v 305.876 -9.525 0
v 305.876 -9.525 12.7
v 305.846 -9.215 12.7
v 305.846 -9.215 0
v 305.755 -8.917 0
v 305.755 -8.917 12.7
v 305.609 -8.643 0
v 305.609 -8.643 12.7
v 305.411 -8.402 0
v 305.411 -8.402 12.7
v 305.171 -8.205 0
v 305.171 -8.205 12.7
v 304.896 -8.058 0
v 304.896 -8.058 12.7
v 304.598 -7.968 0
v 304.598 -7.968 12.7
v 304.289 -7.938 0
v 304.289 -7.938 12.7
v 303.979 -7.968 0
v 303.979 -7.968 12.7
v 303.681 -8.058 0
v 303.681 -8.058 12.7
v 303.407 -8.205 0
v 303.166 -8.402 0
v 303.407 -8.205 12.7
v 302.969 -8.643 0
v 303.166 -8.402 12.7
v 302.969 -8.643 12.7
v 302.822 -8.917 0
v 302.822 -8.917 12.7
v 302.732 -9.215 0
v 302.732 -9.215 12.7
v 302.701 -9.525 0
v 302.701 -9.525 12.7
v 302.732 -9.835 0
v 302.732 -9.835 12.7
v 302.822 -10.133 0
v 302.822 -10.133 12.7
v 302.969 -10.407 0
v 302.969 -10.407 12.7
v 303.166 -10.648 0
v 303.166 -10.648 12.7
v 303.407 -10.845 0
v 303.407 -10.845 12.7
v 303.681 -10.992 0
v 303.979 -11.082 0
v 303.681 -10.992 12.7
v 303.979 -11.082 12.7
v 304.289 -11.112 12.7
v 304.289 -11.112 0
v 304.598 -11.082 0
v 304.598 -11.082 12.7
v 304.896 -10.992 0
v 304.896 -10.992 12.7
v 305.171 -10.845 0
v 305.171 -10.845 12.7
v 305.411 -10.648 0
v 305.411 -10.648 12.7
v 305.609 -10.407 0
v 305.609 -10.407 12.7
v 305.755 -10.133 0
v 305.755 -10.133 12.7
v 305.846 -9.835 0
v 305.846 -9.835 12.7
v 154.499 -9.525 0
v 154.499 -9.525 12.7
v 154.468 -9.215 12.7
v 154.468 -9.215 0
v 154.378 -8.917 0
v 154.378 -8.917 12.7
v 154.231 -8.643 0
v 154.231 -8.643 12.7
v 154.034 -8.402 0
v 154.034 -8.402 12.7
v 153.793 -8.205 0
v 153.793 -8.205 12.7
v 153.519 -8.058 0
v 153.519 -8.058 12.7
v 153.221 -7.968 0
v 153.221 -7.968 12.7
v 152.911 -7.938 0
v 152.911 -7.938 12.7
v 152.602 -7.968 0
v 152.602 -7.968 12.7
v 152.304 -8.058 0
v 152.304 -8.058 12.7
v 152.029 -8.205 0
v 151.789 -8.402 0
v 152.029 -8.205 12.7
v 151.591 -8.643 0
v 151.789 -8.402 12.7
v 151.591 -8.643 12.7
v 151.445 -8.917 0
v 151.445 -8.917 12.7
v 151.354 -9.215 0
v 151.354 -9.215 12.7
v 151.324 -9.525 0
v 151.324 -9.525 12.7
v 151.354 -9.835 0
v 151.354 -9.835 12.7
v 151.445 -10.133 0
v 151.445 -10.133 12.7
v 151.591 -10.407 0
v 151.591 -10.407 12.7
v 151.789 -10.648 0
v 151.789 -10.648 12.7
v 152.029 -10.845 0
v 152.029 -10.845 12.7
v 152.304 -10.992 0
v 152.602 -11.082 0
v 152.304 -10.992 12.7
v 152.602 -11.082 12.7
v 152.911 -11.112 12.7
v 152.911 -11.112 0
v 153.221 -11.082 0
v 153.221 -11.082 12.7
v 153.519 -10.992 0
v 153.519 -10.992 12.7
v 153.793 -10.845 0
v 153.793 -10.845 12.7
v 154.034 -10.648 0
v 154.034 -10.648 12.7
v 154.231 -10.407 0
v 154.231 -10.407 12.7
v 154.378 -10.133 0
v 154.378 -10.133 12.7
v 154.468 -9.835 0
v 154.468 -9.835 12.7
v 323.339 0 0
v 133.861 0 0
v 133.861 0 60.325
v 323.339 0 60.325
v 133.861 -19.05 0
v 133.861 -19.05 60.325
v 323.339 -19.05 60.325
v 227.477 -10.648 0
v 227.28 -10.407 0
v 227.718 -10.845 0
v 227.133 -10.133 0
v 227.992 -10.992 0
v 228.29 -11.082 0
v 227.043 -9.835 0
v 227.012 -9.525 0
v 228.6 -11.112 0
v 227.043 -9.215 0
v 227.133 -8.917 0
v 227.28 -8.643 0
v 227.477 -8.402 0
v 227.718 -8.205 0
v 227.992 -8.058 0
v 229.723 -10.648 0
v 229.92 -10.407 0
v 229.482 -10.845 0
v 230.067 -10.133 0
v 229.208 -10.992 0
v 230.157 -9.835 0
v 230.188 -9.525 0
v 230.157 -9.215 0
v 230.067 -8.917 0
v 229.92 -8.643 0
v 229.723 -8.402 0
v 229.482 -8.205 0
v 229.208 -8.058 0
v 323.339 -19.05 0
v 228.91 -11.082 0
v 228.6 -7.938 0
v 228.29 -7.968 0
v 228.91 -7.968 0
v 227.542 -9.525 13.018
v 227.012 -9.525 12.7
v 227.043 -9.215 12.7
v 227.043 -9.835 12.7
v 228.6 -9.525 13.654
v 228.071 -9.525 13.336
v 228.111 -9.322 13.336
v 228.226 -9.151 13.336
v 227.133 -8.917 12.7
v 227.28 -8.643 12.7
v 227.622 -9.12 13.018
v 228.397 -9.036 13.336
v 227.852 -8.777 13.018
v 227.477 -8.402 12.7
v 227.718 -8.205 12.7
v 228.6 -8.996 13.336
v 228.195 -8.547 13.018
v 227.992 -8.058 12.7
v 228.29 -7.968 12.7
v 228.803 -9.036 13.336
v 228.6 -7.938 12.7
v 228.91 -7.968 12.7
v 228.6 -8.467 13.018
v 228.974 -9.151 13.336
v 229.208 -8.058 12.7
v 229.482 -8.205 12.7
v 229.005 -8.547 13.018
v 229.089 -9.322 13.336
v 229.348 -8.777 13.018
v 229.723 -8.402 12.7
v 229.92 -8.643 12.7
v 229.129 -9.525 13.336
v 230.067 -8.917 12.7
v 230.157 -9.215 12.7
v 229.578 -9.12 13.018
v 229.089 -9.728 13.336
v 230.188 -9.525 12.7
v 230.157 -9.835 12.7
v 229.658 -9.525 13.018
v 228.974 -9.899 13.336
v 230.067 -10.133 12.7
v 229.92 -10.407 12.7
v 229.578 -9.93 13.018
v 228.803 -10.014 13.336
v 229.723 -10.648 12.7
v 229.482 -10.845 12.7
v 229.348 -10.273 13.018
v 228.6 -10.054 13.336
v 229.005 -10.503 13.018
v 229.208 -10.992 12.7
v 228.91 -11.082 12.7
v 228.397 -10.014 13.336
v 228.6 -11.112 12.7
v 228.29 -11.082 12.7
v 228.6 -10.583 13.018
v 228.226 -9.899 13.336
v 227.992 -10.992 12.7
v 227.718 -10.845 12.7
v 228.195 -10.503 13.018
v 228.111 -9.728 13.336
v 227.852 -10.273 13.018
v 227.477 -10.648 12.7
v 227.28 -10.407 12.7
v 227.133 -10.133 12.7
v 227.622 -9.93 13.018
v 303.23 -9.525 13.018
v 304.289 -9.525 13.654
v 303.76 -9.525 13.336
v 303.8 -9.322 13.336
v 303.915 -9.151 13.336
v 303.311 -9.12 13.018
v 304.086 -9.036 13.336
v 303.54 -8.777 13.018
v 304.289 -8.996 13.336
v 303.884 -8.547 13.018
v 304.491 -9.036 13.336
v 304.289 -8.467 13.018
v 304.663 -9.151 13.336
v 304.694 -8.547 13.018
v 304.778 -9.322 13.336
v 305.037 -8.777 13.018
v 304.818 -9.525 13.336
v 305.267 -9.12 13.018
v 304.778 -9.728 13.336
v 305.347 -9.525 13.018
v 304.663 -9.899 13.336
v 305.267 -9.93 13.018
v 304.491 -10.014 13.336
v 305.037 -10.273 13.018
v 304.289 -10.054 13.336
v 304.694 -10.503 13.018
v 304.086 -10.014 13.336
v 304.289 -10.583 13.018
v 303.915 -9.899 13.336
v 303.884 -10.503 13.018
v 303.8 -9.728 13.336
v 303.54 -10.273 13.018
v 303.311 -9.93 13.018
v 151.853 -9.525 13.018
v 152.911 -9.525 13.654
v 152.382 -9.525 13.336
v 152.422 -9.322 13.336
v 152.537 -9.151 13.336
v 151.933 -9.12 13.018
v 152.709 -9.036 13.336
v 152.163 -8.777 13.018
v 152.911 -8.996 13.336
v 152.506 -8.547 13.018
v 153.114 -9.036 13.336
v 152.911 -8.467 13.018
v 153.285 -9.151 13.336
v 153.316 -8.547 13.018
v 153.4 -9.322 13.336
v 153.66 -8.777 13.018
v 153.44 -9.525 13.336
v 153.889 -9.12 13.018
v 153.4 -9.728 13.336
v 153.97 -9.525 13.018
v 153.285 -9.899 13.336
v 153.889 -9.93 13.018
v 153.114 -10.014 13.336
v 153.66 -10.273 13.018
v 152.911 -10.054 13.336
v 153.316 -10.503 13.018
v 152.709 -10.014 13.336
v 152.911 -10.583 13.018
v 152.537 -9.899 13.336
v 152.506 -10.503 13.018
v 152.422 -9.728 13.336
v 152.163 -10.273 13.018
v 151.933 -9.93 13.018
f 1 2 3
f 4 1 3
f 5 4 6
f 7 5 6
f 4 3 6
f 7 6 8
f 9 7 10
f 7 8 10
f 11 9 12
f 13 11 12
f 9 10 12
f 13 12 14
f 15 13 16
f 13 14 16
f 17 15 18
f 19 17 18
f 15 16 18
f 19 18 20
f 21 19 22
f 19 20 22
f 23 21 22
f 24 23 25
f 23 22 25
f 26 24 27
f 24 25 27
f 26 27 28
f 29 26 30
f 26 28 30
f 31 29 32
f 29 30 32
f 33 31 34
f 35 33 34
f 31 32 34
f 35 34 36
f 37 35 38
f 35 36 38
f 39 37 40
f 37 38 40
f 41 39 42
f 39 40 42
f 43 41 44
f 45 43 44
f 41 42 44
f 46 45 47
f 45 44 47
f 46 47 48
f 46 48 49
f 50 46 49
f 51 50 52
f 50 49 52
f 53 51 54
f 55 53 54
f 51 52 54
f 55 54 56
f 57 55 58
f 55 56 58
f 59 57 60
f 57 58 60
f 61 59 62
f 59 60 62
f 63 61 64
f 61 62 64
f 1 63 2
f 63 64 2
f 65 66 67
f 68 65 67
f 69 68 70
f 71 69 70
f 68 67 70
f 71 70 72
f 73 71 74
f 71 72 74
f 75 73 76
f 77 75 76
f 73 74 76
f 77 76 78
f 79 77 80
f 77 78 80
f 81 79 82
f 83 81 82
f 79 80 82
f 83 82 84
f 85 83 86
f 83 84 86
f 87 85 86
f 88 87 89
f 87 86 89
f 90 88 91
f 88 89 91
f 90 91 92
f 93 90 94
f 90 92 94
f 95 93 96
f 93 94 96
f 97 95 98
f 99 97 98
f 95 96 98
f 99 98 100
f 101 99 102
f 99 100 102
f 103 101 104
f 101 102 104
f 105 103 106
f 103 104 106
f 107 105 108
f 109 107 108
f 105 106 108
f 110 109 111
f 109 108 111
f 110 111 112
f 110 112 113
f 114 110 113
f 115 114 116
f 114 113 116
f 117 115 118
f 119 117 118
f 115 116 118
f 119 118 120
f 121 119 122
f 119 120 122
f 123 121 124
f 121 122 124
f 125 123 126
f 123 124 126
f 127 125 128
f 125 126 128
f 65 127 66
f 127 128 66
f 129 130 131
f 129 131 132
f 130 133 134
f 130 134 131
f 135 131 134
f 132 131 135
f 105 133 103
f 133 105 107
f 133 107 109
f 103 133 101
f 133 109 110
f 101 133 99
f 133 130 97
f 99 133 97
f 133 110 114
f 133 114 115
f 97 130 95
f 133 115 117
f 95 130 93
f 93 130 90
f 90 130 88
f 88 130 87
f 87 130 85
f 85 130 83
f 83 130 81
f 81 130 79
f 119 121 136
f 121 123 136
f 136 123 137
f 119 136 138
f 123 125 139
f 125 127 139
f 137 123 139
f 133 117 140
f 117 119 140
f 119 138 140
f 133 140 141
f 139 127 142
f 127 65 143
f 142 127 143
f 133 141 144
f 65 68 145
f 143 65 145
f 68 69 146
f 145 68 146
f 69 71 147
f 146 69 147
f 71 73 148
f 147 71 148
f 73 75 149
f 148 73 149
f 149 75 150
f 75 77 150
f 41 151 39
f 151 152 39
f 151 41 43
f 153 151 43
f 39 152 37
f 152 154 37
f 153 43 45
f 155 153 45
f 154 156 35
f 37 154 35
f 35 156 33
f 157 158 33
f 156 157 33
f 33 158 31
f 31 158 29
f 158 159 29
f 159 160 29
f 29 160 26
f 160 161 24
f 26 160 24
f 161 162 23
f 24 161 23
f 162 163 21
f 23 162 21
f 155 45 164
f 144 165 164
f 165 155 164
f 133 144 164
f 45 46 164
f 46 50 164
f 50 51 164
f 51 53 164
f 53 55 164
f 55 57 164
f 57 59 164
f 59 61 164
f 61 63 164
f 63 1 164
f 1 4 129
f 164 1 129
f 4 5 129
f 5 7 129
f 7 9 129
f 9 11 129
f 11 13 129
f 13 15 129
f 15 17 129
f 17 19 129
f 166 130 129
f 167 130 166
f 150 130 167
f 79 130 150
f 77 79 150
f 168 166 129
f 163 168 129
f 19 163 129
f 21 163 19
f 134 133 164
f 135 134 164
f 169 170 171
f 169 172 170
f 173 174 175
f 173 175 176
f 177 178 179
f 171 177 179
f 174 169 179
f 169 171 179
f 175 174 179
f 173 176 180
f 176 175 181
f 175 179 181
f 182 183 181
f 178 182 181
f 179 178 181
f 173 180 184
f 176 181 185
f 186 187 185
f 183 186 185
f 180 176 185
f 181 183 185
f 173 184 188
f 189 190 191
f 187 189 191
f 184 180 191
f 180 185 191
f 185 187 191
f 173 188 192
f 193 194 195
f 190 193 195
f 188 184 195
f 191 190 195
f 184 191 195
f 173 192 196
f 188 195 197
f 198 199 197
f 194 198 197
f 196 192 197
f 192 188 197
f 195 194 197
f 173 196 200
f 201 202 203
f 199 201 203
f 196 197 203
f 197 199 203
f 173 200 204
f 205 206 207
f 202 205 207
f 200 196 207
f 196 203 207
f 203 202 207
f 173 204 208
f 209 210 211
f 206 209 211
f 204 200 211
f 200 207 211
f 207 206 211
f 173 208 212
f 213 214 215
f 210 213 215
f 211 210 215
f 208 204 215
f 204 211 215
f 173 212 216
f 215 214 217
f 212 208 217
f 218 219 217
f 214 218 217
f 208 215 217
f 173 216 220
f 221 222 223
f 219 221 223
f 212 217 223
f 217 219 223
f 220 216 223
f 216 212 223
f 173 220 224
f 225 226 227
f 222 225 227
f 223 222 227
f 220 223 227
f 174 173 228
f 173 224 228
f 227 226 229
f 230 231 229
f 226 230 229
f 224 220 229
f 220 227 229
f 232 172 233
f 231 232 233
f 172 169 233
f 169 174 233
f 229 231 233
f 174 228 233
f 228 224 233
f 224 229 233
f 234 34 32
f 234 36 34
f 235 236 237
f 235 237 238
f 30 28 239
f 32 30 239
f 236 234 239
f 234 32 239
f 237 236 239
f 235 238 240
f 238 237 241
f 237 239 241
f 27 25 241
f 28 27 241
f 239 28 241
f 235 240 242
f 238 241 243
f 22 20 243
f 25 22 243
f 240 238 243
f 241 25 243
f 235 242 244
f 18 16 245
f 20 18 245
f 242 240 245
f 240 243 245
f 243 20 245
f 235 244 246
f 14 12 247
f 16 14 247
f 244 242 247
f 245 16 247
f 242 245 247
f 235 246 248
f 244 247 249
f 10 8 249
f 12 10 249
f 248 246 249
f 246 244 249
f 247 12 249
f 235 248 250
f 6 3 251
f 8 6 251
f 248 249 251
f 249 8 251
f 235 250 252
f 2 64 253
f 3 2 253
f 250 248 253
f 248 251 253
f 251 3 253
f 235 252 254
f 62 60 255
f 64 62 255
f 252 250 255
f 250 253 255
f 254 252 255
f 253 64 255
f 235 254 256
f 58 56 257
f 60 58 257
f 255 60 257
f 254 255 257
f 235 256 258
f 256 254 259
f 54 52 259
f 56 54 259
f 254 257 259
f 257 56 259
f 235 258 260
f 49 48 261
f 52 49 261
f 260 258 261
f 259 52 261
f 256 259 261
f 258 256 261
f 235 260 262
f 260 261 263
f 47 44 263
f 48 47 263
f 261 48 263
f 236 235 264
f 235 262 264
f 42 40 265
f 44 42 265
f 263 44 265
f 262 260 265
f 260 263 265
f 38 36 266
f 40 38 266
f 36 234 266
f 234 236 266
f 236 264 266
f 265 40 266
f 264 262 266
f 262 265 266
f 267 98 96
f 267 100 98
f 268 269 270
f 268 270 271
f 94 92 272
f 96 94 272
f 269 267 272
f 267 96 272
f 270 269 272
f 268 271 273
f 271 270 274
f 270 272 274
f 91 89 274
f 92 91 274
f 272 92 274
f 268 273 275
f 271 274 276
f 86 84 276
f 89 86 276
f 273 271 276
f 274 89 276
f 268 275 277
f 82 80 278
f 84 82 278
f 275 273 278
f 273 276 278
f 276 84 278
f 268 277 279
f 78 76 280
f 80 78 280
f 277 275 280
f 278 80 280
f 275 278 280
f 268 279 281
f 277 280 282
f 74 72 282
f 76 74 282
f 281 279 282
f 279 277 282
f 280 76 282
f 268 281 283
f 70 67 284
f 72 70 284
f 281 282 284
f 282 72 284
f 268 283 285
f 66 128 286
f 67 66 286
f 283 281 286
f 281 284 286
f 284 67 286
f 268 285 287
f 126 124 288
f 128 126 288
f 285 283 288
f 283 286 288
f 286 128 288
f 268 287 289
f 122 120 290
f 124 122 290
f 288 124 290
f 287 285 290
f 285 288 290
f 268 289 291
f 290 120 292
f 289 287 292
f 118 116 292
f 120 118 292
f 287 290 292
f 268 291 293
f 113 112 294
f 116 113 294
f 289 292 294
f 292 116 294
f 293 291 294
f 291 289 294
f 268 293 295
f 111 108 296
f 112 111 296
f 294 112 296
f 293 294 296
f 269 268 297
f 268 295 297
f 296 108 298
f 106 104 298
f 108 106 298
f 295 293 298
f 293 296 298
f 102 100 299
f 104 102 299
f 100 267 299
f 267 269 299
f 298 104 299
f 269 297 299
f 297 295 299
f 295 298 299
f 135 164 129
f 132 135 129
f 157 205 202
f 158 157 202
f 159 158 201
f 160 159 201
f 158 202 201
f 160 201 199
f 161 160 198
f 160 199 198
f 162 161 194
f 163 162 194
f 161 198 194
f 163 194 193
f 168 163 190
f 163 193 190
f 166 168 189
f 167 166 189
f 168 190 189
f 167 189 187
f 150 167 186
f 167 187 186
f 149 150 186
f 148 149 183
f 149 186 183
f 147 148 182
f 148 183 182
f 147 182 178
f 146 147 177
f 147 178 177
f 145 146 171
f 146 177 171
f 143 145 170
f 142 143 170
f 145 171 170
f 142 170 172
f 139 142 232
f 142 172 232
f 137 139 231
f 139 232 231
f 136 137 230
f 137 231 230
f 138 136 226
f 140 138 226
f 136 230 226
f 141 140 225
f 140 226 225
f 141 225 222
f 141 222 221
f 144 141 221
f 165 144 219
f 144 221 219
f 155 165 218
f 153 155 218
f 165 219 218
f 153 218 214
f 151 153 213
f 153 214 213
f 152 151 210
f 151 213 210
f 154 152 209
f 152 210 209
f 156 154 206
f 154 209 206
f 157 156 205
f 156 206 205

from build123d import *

# Parameters (mm, degrees)
SKETCH1_W           = 189.477532672
SKETCH1_H           = 19.05
BOSS_EXTRUDE1_DEPTH = 60.325
HOLE1_D             = 3.175
HOLE1_DEPTH         = 38.1
HOLE1_CSINK_D       = 10.16
HOLE1_CSINK_ANGLE   = 82
HOLE1_TIP           = 0.953866233


with BuildPart() as part:
    # Sketch1 → Boss-Extrude1 (new body)
    with BuildSketch(Plane.XY):
        with Locations((228.6, -9.525)):
            Rectangle(SKETCH1_W, SKETCH1_H)
    extrude(amount=BOSS_EXTRUDE1_DEPTH)

    # Hole1
    with Locations(Plane(origin=(228.6, 0, -25.4), x_dir=(-1, 0, 0), z_dir=(0, 0, -1))):
        with Locations((-75.688766336, -9.525), (218.563766336, -31.75), (218.563766336, -218.821), (218.563766336, -418.592), (104.263766336, -19.05), (104.263766336, -149.225), (104.263766336, -279.4), (120.138766336, -330.2), (120.138766336, -441.325), (-120.138766336, -441.325), (-120.138766336, -330.2), (-104.263766336, -279.4), (-104.263766336, -149.225), (-104.263766336, -19.05), (-218.563766336, -418.592), (-218.563766336, -218.821), (-218.563766336, -31.75), (0, -304.8), (107.438766336, -304.8), (-107.438766336, -304.8), (75.688766336, -276.225), (0, -276.225), (-75.688766336, -276.225), (75.688766336, -9.525), (0, -9.525)):
            CounterSinkHole(HOLE1_D / 2, HOLE1_CSINK_D / 2, depth=HOLE1_DEPTH, counter_sink_angle=HOLE1_CSINK_ANGLE)
            with Locations((0, 0, -(HOLE1_DEPTH + HOLE1_TIP / 2))):  # 118° drill point
                Cone(0, HOLE1_D / 2, HOLE1_TIP, mode=Mode.SUBTRACT)


solid = part.part
